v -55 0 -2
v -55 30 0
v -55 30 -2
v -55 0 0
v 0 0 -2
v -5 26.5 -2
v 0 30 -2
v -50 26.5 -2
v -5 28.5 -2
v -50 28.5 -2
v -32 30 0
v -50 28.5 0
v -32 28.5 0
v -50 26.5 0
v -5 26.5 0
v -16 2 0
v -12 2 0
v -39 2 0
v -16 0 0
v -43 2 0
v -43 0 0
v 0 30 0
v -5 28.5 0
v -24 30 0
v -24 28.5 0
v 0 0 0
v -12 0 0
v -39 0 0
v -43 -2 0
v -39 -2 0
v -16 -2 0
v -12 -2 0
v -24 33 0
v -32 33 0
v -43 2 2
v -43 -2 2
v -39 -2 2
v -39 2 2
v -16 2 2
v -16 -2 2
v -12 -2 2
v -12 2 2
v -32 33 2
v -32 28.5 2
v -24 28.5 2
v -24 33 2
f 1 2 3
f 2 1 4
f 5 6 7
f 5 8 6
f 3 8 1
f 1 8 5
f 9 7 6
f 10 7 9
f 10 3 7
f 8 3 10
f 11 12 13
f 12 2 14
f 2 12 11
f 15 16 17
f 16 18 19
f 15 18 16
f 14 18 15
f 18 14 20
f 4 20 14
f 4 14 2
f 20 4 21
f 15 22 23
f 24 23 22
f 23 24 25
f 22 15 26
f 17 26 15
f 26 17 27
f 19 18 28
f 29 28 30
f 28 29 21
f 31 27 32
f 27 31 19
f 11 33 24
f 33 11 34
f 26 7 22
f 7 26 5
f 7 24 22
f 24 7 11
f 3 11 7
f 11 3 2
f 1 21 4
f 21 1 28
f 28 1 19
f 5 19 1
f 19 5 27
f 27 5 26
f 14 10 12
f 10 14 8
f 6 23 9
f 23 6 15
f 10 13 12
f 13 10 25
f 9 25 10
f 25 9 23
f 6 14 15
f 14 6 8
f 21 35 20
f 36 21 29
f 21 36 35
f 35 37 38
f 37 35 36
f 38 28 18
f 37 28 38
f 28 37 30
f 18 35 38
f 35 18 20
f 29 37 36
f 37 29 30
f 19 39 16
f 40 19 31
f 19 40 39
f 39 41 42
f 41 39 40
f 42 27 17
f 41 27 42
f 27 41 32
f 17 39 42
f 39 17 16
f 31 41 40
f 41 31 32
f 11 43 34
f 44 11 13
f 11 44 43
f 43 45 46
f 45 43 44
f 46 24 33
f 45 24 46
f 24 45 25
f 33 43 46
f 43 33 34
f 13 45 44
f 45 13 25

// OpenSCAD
// Simple battery cover with 1 and 2 slots to hold it in place


// length of the cover/base plate
x=55;

//width of the cover/base plate
y=30;

// thickness of the cover/base plate
thickness=2;

// width of the 2 holders on the back side (other side with regards to the slot)
double_holder_width = 4;

// legnth of each of the 2 holders, including overlap with the base plate
double_holder_length = 4;

// overlap of each holder with the base plate
double_holder_overlap = 2;

// thickness of each holder
double_holder_thickness = 2;

// distance between the holder and the edge of the base plate
double_holder_offset = 12;

// same as previous offset, but measured from the other side
double_holder_offset2 = x - double_holder_offset - double_holder_width; 

// dimensions of the slot that allows to move the slot holder
slot_length = 45;

// thickness of the slot (in the X axis)
slot_thickness = 2;

// distance between long side of slot and base plate edge
slot_y = 1.5;

// distance between short side of slot and base plate edge
slot_offset = 5;

// width of the single holder at the front (near the slot)
slot_holder_width = 8;

// distance from the edge of the base plate to the holder
slot_holder_offset = 24;
// overlap of the single holder with the base plate
slot_holder_overlap = 1.5;
// length of the single holder, includes overlap
slot_holder_length = 4.5;

// thickness of the holder
slot_holder_thickness = 2;

rotate([0,180,0]) {

difference() {
    cube([x,y,thickness]);
    translate([slot_offset, y-slot_y-slot_thickness, 0]) cube([slot_length, slot_thickness, thickness]);
}

translate([double_holder_offset2, double_holder_overlap-double_holder_length, -thickness]) cube([double_holder_width, double_holder_length, double_holder_thickness]);

translate([double_holder_offset, double_holder_overlap-double_holder_length, -thickness]) cube([double_holder_width, double_holder_length, double_holder_thickness]);

translate([slot_holder_offset, y - slot_holder_overlap, -thickness]) cube([slot_holder_width, slot_holder_length, slot_holder_thickness]);
}
